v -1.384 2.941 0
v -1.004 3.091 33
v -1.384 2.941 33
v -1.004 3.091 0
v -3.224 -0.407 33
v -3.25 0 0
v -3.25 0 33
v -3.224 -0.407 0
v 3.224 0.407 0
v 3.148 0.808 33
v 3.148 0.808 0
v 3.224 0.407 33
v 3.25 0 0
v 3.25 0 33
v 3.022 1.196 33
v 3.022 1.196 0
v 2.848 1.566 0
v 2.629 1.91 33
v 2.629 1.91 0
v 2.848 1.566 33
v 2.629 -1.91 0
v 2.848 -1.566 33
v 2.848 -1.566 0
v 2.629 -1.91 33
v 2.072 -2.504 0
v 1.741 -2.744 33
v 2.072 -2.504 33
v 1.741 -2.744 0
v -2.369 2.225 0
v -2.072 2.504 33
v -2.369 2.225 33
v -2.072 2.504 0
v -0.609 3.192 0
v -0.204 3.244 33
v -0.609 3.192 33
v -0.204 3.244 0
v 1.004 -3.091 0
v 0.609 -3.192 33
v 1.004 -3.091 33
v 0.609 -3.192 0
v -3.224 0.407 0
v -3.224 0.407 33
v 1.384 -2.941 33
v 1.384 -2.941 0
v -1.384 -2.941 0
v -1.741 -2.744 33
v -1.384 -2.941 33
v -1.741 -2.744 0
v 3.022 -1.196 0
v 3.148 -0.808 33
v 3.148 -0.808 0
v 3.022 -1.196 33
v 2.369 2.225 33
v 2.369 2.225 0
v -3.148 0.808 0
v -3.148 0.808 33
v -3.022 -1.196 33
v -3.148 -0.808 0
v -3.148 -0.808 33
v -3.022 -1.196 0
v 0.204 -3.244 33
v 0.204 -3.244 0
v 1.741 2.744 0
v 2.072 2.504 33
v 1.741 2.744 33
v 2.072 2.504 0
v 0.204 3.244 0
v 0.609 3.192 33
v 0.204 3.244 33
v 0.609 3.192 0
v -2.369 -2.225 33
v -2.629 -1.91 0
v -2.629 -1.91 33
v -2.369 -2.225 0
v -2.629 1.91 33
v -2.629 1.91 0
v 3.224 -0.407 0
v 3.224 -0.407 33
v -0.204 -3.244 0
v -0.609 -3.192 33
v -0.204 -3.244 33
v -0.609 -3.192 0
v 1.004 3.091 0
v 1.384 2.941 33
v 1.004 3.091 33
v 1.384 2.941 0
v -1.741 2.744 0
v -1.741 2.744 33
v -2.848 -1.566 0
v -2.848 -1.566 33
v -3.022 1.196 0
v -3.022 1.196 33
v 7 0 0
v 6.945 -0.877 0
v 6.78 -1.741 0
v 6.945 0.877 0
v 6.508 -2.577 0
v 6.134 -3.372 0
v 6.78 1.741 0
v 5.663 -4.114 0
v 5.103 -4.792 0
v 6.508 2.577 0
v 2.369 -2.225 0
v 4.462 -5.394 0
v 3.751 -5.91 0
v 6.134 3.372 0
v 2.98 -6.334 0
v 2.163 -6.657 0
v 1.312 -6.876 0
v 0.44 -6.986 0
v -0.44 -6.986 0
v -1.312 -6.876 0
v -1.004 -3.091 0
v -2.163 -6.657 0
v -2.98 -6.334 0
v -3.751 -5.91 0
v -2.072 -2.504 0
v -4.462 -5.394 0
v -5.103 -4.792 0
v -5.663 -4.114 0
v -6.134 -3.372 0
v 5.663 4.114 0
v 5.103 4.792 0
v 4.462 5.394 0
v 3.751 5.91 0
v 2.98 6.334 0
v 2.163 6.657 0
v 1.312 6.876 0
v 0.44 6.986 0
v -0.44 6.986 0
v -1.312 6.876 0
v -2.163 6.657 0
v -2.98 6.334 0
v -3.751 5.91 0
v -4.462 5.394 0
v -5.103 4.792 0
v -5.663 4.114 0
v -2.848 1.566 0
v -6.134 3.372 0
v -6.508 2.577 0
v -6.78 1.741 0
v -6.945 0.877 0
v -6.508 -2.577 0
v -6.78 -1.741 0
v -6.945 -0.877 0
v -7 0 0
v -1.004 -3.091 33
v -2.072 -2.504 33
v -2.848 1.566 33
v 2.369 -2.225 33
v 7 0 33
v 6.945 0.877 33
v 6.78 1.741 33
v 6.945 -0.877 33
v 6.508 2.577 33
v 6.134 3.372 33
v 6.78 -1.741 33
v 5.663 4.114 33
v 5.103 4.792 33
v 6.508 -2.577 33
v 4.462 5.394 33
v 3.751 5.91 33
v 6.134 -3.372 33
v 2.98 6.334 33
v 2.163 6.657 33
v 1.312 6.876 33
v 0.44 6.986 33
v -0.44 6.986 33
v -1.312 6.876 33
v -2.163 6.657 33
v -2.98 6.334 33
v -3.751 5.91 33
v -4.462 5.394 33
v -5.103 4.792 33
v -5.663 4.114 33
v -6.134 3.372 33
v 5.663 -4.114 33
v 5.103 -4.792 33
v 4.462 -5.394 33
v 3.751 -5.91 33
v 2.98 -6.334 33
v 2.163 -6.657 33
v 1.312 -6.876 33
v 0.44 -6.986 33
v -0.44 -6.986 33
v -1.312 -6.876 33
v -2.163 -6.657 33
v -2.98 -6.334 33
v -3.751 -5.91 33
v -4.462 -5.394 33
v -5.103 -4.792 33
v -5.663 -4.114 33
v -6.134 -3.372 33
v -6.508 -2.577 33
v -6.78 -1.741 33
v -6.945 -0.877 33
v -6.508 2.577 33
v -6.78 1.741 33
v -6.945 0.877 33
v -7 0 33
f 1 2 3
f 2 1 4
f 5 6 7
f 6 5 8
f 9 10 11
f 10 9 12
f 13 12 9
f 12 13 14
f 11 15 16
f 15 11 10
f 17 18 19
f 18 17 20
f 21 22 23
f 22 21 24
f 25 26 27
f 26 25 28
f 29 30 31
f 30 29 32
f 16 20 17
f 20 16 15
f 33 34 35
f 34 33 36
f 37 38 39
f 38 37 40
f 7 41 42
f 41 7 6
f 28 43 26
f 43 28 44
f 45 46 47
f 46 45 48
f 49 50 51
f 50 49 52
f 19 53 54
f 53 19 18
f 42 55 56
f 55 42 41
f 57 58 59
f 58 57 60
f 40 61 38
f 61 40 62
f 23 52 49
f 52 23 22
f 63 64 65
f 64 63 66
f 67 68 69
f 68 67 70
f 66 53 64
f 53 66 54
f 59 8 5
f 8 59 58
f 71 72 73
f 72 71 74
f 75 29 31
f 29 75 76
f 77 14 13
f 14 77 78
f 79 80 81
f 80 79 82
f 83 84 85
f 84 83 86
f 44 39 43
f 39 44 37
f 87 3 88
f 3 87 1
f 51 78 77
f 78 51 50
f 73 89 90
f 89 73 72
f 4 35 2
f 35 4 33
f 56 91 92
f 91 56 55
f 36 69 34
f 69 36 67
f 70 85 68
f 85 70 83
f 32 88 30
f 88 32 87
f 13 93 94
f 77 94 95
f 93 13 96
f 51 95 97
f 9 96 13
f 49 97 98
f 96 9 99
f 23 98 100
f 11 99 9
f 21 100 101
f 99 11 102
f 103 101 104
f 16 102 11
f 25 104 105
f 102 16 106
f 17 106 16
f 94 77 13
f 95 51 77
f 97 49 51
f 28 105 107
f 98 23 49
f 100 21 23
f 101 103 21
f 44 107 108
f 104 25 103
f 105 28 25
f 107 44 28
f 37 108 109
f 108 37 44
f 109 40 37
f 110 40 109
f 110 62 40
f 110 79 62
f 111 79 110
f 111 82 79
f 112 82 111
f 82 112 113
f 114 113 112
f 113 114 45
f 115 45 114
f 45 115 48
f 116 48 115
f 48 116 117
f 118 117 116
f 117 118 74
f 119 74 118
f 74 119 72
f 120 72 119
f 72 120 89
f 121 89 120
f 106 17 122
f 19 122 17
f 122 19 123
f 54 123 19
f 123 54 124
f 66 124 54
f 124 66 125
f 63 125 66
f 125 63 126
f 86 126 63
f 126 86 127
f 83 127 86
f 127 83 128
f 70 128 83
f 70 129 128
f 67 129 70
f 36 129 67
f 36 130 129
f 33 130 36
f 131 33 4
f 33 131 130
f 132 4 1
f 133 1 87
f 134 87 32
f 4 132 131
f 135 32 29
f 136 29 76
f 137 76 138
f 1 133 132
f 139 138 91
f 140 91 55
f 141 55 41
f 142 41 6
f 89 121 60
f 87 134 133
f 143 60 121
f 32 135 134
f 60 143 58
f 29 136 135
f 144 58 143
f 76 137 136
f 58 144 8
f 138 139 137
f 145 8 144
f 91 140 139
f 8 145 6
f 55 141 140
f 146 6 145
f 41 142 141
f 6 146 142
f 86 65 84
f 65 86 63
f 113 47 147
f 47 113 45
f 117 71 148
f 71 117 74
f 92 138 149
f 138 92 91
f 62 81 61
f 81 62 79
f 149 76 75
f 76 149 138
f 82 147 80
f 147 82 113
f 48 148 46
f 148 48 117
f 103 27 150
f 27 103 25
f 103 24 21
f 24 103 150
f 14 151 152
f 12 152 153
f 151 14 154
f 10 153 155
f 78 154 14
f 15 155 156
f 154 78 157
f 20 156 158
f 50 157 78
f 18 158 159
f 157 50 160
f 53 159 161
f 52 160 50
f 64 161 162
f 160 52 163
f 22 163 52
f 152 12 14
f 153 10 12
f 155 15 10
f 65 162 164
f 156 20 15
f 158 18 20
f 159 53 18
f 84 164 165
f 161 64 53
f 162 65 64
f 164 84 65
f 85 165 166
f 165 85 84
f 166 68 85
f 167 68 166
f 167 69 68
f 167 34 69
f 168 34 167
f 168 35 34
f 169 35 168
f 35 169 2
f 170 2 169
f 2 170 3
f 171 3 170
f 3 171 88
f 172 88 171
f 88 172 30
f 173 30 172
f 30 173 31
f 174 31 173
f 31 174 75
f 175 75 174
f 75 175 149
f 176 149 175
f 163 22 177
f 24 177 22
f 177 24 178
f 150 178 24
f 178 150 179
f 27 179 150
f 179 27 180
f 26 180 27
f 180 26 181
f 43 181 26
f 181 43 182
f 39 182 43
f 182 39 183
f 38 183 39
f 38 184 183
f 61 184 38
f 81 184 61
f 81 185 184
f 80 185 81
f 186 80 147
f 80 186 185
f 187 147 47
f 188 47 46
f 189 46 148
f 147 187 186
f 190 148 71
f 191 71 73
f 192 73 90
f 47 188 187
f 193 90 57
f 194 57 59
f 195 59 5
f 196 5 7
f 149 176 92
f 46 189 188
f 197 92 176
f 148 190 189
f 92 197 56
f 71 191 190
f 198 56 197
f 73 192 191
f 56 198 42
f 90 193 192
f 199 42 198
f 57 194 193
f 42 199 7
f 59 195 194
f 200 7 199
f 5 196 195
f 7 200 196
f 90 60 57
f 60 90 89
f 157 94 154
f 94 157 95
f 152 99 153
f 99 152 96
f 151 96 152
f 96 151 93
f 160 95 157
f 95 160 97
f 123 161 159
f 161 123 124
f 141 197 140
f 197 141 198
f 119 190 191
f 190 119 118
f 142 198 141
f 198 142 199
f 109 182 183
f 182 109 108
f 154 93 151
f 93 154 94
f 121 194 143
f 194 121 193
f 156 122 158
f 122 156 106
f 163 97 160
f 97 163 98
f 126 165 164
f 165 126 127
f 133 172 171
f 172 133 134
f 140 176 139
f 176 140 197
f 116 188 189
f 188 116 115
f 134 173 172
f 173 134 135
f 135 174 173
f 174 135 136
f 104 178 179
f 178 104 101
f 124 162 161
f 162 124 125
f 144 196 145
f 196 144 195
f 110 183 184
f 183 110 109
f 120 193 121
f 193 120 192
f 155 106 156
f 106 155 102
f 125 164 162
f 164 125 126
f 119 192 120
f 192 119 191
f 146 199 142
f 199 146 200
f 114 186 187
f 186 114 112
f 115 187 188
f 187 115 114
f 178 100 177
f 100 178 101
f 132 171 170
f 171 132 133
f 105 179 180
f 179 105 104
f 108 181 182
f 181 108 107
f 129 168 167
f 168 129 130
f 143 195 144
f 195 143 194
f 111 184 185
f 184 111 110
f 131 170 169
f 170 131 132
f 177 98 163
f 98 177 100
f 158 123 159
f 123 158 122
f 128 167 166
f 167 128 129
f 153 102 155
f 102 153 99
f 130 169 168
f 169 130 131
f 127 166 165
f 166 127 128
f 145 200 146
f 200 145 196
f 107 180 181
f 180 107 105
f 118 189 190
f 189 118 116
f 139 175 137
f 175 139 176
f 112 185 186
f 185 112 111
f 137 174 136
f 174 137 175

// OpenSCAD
$fn = 50;


difference() {
	union() {
		cylinder(h = 33, r = 7.0000000000);
	}
	union() {
		cylinder(h = 33, r = 3.2500000000);
		cylinder(h = 33, r = 3.2500000000);
		cylinder(h = 33, r = 1.8000000000);
		cylinder(h = 33, r = 1.8000000000);
		cylinder(h = 33, r = 1.8000000000);
		cylinder(h = 33, r = 1.8000000000);
		cylinder(h = 33, r = 1.8000000000);
		cylinder(h = 33, r = 1.8000000000);
	}
}
